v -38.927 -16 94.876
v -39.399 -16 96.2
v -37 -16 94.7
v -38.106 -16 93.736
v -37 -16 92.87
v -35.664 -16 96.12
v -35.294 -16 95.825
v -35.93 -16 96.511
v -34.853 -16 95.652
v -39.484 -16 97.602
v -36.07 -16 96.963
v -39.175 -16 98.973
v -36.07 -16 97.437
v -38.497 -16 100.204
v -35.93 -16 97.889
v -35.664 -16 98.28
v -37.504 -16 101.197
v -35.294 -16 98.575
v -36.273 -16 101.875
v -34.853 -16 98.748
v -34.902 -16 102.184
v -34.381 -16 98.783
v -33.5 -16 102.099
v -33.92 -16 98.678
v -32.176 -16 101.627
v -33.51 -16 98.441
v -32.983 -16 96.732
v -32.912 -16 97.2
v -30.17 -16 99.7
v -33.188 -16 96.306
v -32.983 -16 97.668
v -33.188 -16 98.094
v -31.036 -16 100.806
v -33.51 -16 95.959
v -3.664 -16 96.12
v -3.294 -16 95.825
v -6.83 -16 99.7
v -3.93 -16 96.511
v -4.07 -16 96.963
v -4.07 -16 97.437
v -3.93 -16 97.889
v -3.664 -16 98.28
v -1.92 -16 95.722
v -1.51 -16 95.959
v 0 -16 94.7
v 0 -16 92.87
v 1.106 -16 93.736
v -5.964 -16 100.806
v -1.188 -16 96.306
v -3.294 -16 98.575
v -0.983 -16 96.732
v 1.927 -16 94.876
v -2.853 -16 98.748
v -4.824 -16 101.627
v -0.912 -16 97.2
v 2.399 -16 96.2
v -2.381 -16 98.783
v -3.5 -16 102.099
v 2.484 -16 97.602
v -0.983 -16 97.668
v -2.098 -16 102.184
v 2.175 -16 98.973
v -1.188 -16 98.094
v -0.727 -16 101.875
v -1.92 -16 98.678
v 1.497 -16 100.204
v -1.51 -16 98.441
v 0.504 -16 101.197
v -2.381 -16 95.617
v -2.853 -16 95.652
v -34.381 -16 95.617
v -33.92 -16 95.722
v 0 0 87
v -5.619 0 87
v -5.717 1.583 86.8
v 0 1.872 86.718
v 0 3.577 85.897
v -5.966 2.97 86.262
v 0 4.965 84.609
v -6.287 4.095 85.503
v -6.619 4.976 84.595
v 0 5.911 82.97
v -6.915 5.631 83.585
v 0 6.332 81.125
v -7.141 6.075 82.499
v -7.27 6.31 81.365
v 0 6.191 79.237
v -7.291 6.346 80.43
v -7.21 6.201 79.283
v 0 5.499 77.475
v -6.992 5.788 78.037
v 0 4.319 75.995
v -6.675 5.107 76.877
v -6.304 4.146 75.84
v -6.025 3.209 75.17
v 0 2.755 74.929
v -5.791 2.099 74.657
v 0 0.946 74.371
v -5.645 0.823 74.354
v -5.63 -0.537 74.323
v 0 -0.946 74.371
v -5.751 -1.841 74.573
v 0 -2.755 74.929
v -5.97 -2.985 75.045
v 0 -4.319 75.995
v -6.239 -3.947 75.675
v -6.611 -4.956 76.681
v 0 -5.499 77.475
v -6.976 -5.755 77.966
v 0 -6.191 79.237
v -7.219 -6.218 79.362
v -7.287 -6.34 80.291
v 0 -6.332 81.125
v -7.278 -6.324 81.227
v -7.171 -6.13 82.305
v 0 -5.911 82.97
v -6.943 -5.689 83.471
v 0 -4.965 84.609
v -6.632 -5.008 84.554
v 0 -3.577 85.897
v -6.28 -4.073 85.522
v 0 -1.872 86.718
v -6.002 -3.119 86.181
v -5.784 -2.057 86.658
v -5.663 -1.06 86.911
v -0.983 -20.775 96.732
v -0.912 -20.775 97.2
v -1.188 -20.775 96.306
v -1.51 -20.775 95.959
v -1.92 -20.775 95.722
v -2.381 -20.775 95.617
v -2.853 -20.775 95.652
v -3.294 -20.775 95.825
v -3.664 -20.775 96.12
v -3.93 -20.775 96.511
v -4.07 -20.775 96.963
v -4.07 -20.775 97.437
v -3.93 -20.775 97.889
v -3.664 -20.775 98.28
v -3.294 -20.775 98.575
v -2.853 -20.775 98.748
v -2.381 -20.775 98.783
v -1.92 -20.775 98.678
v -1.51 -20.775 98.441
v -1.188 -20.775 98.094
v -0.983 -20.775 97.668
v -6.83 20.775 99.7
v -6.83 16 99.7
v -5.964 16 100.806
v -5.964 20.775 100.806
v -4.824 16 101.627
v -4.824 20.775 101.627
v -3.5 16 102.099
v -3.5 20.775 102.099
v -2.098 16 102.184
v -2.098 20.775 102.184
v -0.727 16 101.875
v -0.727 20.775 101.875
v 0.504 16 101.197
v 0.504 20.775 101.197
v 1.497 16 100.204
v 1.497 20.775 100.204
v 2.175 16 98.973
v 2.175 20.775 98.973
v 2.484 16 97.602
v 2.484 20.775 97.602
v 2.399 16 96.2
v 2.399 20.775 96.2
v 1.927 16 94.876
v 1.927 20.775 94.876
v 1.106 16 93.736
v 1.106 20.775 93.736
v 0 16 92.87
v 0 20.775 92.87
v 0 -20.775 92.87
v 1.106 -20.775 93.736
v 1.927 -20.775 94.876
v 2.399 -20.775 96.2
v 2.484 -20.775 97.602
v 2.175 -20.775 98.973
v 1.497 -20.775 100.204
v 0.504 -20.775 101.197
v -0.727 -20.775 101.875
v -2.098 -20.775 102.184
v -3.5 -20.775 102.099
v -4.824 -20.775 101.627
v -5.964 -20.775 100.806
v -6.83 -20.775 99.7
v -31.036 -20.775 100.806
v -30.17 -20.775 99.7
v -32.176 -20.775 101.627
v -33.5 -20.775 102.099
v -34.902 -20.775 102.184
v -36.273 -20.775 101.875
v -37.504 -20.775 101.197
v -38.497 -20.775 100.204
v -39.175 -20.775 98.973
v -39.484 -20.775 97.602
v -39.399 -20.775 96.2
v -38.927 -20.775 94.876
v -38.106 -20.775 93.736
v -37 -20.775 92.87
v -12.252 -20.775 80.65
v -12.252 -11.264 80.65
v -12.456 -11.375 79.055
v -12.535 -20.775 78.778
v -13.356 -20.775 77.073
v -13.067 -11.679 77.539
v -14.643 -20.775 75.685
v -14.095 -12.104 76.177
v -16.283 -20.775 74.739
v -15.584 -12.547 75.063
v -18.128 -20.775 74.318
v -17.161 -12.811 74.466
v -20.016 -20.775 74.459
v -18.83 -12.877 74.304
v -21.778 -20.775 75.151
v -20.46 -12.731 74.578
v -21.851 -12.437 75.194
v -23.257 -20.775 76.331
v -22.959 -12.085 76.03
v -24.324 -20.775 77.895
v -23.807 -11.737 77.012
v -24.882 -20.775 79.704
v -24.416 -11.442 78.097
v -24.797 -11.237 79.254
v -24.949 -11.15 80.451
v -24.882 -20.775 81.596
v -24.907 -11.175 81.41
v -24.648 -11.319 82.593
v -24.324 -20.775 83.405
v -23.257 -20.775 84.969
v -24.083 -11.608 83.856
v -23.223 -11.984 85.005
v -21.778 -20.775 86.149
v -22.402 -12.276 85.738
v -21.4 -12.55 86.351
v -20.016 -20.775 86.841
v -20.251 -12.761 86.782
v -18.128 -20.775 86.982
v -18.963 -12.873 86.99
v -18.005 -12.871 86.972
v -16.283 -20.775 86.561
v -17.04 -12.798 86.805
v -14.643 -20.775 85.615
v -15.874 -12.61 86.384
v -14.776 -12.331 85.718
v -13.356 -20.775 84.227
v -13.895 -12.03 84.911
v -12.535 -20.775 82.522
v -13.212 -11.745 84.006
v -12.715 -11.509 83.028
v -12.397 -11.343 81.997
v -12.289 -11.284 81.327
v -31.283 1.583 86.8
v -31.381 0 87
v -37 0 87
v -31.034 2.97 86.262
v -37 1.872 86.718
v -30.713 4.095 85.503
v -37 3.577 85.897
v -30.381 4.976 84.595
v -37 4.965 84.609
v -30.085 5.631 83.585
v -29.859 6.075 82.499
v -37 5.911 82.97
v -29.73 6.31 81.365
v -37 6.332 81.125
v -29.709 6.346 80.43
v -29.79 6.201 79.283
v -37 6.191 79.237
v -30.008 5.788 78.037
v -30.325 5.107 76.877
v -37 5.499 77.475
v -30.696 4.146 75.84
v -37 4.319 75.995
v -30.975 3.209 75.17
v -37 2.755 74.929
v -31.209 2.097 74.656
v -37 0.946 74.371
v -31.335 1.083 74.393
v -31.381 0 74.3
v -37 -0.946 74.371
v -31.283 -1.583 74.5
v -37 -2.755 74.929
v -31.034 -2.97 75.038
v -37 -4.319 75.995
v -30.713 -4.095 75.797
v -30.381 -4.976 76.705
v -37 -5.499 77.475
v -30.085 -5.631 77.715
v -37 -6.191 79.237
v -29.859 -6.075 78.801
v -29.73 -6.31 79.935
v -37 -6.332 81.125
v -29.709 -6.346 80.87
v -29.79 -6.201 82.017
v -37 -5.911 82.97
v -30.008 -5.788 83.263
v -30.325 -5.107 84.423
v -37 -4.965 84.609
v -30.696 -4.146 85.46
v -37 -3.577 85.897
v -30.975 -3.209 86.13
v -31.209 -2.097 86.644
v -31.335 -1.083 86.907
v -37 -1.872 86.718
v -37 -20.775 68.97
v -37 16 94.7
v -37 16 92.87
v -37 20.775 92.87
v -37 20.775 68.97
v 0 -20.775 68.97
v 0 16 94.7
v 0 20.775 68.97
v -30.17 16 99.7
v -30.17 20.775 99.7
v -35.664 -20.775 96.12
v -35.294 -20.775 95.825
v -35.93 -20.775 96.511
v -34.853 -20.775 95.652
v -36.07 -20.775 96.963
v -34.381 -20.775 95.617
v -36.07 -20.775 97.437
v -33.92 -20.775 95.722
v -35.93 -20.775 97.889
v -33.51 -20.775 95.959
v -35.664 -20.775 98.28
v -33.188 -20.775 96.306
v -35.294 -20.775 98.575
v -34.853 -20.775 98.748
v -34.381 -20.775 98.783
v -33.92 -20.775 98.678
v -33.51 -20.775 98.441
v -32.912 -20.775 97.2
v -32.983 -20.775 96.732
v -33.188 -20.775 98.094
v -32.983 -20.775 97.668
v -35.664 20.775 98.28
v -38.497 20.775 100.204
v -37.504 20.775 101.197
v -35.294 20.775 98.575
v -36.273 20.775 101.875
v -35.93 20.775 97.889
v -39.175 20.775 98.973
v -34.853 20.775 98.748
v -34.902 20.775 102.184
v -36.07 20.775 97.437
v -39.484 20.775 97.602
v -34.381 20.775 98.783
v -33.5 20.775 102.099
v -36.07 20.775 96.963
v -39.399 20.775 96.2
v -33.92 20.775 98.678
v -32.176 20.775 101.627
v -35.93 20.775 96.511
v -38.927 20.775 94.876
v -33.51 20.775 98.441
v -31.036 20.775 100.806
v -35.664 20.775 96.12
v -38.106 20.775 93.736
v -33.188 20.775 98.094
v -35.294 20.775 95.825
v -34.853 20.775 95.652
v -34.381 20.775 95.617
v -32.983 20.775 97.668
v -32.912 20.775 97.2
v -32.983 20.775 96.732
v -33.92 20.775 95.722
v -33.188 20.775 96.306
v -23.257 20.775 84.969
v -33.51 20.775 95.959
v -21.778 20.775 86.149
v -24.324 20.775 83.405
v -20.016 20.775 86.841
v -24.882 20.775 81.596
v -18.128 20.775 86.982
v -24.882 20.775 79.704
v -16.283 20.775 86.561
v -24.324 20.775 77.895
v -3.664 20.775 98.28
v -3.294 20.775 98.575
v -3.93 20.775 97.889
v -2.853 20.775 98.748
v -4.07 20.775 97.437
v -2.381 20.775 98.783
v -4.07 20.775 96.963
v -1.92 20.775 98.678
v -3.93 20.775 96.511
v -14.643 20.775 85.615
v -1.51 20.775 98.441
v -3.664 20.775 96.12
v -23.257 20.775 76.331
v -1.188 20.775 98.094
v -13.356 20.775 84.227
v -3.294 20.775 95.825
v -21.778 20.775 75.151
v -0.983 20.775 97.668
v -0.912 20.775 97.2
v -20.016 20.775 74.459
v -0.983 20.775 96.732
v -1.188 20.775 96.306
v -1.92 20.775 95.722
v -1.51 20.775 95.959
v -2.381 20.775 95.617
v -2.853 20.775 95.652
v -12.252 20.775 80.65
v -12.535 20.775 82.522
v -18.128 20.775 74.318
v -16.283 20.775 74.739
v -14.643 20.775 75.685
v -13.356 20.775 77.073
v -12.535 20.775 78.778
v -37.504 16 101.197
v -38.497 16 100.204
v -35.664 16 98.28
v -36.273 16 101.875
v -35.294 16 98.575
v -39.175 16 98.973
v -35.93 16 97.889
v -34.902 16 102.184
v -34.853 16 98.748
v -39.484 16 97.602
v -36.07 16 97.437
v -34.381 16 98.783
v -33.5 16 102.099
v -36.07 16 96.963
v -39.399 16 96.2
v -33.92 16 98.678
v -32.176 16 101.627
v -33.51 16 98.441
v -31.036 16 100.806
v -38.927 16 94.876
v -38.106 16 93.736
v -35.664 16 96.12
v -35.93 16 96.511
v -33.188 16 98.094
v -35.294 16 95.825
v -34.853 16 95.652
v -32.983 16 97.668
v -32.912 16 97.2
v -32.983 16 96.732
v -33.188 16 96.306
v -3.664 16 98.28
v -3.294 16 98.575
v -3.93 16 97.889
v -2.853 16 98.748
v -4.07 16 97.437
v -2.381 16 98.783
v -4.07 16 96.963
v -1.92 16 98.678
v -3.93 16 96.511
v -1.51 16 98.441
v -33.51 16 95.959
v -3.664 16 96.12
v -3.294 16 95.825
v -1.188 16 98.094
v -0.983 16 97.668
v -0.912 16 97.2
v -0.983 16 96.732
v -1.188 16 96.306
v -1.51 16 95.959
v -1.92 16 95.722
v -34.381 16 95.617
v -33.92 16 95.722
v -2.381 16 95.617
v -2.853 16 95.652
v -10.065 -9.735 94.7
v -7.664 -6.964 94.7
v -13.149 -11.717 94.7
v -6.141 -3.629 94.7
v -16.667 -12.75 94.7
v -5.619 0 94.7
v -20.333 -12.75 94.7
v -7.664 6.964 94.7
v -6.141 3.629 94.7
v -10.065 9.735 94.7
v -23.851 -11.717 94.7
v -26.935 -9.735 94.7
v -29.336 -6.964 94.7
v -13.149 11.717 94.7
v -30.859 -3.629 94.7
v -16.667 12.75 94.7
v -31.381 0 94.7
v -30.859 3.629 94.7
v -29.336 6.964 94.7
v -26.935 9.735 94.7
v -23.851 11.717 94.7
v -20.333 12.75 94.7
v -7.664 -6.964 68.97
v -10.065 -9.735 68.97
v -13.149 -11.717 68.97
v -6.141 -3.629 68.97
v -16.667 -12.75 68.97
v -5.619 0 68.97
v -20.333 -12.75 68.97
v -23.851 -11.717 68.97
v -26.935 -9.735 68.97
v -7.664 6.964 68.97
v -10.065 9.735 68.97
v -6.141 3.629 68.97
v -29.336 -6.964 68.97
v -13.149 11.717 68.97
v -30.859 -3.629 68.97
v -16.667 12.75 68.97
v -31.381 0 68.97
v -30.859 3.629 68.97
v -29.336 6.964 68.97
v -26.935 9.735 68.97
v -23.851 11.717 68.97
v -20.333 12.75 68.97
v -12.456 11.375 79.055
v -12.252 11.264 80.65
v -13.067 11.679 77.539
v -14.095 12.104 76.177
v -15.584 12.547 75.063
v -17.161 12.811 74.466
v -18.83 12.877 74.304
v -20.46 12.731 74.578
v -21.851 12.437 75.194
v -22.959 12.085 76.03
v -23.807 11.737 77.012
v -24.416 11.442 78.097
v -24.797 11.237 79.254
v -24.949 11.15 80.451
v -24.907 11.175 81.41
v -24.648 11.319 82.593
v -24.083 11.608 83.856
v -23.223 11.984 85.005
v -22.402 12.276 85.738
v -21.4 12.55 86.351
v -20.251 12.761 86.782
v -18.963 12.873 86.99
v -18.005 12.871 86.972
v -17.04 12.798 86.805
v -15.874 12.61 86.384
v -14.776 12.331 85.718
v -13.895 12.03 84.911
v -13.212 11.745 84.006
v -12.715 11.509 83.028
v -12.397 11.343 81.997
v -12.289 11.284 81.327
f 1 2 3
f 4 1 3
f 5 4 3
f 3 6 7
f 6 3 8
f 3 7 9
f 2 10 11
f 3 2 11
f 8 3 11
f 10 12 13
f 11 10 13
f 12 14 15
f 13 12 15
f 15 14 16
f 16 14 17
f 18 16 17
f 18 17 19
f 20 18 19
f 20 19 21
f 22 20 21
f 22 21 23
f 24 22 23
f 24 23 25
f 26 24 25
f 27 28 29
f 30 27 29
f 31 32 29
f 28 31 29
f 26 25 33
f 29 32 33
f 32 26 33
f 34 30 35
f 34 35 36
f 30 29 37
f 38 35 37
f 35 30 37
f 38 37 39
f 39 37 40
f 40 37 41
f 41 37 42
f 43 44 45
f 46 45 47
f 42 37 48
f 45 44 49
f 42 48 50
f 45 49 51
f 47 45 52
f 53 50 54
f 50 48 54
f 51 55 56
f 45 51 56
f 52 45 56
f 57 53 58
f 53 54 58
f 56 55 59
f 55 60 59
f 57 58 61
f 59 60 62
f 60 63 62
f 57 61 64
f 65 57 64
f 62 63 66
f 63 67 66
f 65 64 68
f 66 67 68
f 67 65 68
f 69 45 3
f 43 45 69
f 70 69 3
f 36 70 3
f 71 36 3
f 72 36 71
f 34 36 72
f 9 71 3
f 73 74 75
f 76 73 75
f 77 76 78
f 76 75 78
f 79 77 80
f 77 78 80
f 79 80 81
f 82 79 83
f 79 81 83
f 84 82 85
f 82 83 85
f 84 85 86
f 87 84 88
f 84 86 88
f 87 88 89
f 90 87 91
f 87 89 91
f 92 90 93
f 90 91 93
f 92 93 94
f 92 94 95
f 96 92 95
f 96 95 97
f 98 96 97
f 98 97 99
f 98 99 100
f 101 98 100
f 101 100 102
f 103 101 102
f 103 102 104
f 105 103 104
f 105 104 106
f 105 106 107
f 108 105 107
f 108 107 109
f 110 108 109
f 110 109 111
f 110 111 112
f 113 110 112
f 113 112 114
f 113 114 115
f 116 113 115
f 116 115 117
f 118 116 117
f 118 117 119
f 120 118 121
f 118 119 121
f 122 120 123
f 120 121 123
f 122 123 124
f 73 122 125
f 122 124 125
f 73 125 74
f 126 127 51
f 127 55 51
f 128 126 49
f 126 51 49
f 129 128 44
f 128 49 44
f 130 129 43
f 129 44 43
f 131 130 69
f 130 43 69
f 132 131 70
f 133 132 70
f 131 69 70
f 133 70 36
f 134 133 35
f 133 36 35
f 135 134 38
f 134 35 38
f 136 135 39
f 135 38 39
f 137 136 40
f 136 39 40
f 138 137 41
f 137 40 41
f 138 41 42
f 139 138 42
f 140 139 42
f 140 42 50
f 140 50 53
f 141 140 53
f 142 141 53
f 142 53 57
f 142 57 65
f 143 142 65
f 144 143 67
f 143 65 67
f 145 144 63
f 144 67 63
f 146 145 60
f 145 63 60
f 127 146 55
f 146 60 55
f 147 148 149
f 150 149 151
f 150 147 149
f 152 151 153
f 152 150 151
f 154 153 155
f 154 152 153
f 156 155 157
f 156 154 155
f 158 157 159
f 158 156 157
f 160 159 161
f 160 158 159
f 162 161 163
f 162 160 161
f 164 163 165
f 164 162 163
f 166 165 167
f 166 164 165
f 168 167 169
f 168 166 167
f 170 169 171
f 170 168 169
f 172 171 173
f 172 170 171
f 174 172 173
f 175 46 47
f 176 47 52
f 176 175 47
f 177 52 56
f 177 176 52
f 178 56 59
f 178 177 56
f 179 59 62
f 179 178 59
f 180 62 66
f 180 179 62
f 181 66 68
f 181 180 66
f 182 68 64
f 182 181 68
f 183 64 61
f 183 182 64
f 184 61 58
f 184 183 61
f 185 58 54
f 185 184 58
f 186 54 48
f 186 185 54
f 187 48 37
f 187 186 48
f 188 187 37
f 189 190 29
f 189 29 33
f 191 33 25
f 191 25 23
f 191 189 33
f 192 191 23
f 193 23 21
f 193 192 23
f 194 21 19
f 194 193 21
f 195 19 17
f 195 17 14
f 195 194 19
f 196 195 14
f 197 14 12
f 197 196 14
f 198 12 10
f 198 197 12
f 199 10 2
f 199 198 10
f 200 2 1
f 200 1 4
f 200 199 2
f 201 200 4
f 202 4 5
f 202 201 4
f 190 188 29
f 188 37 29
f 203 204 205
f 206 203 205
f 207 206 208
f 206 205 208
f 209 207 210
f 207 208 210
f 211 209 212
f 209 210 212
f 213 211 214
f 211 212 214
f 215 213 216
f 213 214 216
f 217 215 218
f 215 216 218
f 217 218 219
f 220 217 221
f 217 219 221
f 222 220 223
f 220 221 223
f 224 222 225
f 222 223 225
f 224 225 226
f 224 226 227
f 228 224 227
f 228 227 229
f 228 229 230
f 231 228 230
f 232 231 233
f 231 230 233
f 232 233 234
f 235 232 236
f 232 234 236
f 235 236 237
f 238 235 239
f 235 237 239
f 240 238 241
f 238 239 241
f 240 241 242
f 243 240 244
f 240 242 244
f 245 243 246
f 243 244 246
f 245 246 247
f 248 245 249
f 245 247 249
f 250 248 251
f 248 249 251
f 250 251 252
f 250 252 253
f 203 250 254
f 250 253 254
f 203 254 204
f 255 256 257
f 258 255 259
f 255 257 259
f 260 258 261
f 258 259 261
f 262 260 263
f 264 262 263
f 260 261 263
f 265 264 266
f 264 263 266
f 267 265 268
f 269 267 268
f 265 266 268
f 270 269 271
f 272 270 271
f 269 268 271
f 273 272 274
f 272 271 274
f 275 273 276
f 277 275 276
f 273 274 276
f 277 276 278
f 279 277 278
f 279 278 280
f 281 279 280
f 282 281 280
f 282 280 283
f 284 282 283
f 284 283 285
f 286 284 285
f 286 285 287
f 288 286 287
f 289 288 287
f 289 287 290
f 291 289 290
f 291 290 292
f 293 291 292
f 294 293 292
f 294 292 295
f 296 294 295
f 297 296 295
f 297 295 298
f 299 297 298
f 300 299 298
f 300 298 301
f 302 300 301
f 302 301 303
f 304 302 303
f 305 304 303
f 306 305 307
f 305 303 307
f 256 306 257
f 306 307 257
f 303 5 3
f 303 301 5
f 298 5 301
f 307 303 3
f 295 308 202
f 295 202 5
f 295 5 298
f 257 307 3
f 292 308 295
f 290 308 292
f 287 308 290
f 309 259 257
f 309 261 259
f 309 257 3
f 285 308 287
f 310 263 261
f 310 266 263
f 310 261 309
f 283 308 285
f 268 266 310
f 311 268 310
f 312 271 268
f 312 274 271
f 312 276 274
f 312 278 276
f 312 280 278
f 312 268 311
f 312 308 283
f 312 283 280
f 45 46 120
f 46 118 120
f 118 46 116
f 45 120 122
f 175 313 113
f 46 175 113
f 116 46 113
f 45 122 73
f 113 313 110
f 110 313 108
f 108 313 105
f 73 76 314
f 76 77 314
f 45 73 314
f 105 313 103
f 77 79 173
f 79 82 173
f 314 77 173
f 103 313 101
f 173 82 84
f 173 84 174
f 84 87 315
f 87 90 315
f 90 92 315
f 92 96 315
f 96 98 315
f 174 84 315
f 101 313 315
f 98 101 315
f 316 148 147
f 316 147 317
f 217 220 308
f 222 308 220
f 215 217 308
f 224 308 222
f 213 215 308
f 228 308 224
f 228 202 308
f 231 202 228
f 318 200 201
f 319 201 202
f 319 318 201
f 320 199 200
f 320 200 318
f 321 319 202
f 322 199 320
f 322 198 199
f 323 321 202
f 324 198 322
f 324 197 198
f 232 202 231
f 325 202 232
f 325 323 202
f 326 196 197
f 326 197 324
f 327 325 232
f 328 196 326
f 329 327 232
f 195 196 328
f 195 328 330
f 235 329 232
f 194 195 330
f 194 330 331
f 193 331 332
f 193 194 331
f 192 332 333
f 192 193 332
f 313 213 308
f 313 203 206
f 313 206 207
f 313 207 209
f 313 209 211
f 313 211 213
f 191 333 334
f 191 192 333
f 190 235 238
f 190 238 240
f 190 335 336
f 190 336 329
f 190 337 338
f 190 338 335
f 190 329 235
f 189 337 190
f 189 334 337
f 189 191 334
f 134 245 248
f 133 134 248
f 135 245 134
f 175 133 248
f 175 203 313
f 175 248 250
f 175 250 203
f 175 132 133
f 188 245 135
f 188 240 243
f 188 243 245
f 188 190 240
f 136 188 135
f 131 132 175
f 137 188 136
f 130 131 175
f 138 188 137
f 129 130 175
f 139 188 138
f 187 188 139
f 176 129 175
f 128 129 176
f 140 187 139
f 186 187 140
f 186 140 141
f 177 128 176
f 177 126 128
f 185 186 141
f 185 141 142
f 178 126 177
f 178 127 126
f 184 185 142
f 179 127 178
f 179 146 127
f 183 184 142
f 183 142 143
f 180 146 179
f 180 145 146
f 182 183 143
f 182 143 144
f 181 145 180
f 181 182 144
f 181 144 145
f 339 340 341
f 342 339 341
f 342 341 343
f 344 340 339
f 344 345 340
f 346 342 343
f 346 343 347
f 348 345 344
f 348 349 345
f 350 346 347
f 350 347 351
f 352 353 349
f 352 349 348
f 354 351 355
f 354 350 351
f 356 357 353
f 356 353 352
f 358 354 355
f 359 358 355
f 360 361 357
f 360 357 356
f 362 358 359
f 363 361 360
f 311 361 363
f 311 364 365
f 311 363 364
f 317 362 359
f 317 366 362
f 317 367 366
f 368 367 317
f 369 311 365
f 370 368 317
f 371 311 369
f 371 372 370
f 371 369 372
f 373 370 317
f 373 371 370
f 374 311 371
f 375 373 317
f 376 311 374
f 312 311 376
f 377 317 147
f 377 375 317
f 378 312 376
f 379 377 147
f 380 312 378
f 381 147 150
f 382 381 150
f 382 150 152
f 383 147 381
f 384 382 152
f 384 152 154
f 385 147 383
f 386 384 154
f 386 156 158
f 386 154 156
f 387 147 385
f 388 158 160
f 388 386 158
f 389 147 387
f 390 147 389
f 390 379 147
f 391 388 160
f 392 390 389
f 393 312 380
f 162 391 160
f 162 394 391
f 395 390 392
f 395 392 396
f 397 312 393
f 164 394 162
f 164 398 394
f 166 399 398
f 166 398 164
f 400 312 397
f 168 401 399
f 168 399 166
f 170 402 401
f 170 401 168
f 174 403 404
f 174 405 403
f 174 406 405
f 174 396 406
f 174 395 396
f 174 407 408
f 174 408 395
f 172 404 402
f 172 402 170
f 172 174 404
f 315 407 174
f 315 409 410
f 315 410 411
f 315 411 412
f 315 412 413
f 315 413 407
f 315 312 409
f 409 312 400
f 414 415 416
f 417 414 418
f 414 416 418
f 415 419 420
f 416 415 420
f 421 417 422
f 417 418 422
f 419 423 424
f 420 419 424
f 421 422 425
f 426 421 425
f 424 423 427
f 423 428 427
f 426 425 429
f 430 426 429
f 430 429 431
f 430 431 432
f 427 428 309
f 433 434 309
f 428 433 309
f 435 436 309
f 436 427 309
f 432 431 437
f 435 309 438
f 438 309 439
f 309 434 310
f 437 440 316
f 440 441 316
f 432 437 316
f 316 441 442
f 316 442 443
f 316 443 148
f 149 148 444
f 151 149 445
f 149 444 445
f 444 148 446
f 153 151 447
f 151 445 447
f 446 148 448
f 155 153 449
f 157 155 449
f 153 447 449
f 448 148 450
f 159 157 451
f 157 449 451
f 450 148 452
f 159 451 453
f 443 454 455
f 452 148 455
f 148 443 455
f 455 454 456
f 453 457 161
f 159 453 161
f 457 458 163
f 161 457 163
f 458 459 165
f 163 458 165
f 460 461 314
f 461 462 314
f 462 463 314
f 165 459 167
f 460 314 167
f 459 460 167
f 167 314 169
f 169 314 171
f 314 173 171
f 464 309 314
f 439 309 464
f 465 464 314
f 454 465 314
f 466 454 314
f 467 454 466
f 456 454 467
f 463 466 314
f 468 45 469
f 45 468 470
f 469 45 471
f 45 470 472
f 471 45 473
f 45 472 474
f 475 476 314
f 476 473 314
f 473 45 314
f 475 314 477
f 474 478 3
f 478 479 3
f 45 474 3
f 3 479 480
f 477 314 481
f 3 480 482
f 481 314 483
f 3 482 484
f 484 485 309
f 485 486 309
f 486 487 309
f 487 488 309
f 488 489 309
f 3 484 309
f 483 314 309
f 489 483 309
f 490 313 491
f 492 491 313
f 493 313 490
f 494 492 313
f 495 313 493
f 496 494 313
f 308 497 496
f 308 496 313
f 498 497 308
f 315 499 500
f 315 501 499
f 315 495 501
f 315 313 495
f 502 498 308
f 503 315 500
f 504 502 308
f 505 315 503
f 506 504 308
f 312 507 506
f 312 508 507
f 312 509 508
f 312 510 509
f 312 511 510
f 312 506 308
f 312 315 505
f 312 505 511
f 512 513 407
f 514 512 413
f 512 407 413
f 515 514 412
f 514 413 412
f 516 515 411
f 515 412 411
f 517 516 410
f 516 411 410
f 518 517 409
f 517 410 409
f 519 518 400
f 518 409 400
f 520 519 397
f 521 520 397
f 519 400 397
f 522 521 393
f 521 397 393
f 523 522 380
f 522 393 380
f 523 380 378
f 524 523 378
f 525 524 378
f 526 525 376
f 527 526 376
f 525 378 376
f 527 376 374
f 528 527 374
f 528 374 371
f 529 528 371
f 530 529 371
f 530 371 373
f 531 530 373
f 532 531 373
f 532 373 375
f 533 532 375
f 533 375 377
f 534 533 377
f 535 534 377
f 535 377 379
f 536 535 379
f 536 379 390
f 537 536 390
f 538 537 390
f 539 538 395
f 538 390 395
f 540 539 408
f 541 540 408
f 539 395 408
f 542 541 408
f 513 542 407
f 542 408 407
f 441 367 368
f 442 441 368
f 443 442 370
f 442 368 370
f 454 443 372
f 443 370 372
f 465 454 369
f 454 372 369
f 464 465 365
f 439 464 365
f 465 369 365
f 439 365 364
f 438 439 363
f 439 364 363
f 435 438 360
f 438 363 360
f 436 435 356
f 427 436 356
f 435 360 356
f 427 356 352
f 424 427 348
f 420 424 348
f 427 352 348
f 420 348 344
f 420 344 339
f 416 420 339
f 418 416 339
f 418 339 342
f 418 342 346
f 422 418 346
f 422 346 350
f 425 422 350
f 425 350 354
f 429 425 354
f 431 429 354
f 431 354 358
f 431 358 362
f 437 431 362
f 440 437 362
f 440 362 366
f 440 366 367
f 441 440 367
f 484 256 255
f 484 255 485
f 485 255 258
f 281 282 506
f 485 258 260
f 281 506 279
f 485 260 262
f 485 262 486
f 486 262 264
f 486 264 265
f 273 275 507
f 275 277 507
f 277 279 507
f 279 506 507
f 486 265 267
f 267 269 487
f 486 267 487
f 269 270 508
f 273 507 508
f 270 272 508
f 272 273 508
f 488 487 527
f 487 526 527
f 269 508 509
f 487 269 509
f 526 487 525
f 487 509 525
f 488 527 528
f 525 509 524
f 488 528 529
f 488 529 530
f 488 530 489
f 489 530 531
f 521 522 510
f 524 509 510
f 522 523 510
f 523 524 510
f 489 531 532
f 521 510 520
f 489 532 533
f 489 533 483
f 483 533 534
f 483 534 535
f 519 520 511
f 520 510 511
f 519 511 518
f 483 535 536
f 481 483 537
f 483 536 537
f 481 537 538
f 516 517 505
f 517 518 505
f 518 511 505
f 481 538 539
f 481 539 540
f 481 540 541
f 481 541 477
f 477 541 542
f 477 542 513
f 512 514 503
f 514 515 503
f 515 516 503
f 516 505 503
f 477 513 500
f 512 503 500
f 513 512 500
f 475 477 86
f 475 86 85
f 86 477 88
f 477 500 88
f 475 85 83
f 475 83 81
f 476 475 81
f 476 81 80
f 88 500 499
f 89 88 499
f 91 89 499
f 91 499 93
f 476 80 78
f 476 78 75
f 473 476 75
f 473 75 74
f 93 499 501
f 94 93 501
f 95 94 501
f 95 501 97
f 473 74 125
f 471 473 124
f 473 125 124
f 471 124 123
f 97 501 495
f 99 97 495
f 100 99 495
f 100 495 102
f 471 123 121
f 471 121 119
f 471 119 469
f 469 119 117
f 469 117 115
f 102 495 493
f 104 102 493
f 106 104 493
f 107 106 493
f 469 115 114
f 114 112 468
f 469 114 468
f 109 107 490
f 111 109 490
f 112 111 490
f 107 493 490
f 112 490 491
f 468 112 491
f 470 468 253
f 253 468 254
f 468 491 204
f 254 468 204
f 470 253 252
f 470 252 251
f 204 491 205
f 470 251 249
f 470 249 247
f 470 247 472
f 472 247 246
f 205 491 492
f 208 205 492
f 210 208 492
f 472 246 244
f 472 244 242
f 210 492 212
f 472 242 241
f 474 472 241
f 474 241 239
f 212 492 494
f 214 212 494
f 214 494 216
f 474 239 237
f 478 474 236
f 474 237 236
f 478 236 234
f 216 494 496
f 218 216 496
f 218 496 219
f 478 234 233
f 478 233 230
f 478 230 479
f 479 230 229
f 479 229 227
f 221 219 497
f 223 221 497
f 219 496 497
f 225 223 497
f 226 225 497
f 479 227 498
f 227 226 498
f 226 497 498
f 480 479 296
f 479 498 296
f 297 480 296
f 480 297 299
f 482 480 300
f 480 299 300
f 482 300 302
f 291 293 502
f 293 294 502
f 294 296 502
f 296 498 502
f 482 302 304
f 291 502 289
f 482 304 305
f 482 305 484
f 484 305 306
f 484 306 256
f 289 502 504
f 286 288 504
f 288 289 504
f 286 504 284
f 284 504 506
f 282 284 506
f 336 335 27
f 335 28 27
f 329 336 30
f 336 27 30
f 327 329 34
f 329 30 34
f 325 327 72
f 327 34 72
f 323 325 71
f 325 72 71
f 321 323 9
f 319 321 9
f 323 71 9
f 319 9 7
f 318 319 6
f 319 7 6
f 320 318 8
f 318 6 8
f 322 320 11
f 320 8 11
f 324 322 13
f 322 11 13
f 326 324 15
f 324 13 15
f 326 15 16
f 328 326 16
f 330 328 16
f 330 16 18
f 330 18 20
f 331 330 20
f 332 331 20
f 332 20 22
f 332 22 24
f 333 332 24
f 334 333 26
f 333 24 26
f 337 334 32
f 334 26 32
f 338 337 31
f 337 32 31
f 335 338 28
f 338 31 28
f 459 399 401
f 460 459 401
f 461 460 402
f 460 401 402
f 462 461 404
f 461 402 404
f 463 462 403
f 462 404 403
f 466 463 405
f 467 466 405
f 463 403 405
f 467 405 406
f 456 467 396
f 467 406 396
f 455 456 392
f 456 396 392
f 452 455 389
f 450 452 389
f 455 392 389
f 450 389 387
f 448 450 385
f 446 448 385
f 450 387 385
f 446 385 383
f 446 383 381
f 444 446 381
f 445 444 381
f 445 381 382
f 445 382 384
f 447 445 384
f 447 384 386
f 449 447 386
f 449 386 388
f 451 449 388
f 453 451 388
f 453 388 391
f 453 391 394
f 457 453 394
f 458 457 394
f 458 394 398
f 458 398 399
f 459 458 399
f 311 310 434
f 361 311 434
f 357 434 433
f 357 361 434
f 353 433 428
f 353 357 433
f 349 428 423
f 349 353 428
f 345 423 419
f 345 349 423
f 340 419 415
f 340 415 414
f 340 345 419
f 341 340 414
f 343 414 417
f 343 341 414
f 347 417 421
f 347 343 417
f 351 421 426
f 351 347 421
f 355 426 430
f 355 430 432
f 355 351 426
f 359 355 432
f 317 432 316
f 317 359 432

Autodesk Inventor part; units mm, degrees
ref_plane "YZ Plane" through (0, 0, 0) normal (1, 0, 0) x (0, 1, 0)
ref_plane "XZ Plane" through (0, 0, 0) normal (0, 1, 0) x (-1, 0, 0)
ref_plane "XY Plane" through (0, 0, 0) normal (0, 0, 1) x (1, 0, 0)
sketch "Sketch2" plane through (0, 0, 0) normal (1, 0, 0) x (0, 1, 0)
  circle A0 centre (0, 0) radius 12.881
  line L0 (-16, -18.5) -> (16, -18.5)
  line L1 (16, -18.5) -> (16, 18.5)
  line L2 (16, 18.5) -> (-16, 18.5)
  line L3 (-16, 18.5) -> (-16, -18.5)
  line L4 (-16, -18.5) -> (16, 18.5) construction
  line L5 (16, -18.5) -> (-16, 18.5) construction
  dimension "d9" = 25.762
  dimension "d10" = 32
  dimension "d11" = 37
extrude "Extrusion2" add sketch "Sketch2" along normal blind 76.2
sketch "Sketch3" plane through (0, -16, -18.5) normal (0, 0, -1) x (-1, 0, 0)
  line L0 (0, 0) -> (0, 32) projected
  circle A0 centre (18.5, 16) radius 12.881
  line L1 (0, 32) -> (0, 0)
  line L2 (0, 0) -> (37, 0)
  line L3 (37, 0) -> (37, 32)
  line L4 (37, 32) -> (0, 32)
  line L5 (0, 32) -> (37, 0) construction
  line L6 (0, 0) -> (37, 32) construction
  point P0 (0, 16)
  dimension "d14" = 25.762
  dimension "d15" = 32
  dimension "d16" = 37
extrude "Extrusion3" add sketch "Sketch3" against normal blind 113.2
sketch "Sketch4" plane through (76.2, -16, -18.5) normal (0, 0, -1) x (-1, 0, 0)
  circle A0 centre (94.7, 16) radius 12.881 projected
  point P0 (76.2, 16)
extrude "Extrusion4" add sketch "Sketch4" against normal blind 37
sketch "Sketch5" plane through (76.2, 16, 18.5) normal (0, 1, 0) x (1, 0, 0)
  line L0 (-113.2, 37) -> (0, 37) projected
  line L1 (-113.2, 37) -> (-113.2, -76.2) projected
  line L2 (-113.2, 37) -> (-100.1185, 50.0815)
  line L3 (-113.2, 37) -> (-94.7, 37) construction
  line L4 (-113.2, 37) -> (-126.2815, 23.9185)
  line L5 (-113.2, 37) -> (-94.7, 37) construction
  line L6 (-100.1185, 50.0815) -> (-154.0001, 103.963)
  line L7 (-126.2815, 23.9185) -> (-180.163, 77.8001)
  line L8 (-126.2815, 23.9185) -> (-50.0815, 23.9185) construction
  line L9 (-154.0001, 103.963) -> (-180.163, 77.8001)
  line L10 (-100.1185, 50.0815) -> (-87.037, 37)
  line L11 (-126.2815, 23.9185) -> (-113.2, 10.837)
  point P0 (-76.2, 18.5)
  dimension "d21" = 18.5
  dimension "d22" = 45
  dimension "d23" = 18.5
  dimension "d24" = 135
  dimension "d25" = 76.2
  dimension "d26" = 76.2
  dimension "d27" = 135
extrude "Extrusion5" add sketch "Sketch5" against normal blind 32
sketch "Sketch7" plane through (-77.8001, -16, -85.463) normal (-0.7071068, 0, -0.7071068) x (-0.7071068, 0, 0.7071068)
  line L0 (36.4256, 0.4968) -> (36.4256, 31.5032)
  line L1 (36.4256, 31.5032) -> (0.5744, 31.5032)
  line L2 (0.5744, 31.5032) -> (0.5744, 0.4968)
  line L3 (0.5744, 0.4968) -> (36.4256, 0.4968)
  circle A0 centre (18.5, 16) radius 12.881
  point P0 (5.4185, 16)
  point P1 (36.4256, 16)
  dimension "d131" = 25.762
extrude "Extrusion6" cut sketch "Sketch7" against normal blind 101.6 contours A0
sketch "Sketch8" plane through (76.2, 16, 18.5) normal (0, 1, 0) x (1, 0, 0)
  line L0 (-76.2, 0) -> (0, 0) projected
  line L1 (-87.037, 37) -> (0, 37) projected
  line L2 (-87.037, 37) -> (-154.0001, 103.963) projected
  line L3 (-180.163, 77.8001) -> (-113.2, 10.837) projected
  line L4 (-113.2, 10.837) -> (-113.2, -76.2) projected
  line L5 (-76.2, 0) -> (-76.2, -76.2) projected
  line L6 (0, 37) -> (5, 37)
  line L7 (5, 37) -> (5, 0)
  line L8 (5, 0) -> (0, 0)
  line L9 (0, 0) -> (0, 37)
  line L10 (-113.2, -76.2) -> (-76.2, -76.2)
  line L11 (-76.2, -76.2) -> (-76.2, -81.2)
  line L12 (-76.2, -81.2) -> (-113.2, -81.2)
  line L13 (-113.2, -81.2) -> (-113.2, -76.2)
  line L14 (-180.163, 77.8001) -> (-183.6985, 81.3356)
  line L15 (-183.6985, 81.3356) -> (-157.5356, 107.4985)
  line L16 (-157.5356, 107.4985) -> (-154.0001, 103.963)
  point P0 (-76.2, 18.5)
  dimension "d32" = 5
  dimension "d33" = 5
  dimension "d34" = 5
  dimension "d35" = 90
extrude "Extrusion7" add sketch "Sketch8" along normal blind 4.7752
sketch "Sketch9" plane through (76.2, -16, -18.5) normal (0, -1, 0) x (1, 0, 0)
  line L0 (-87.037, 0) -> (0, 0) projected
  line L1 (-76.2, 37) -> (0, 37) projected
  line L2 (-76.2, 37) -> (-76.2, 113.2) projected
  line L3 (-113.2, 26.163) -> (-113.2, 113.2) projected
  line L4 (-113.2, 26.163) -> (-180.163, -40.8001) projected
  line L5 (-154.0001, -66.963) -> (-87.037, 0) projected
  line L6 (-76.2, 118.2) -> (-76.2, 37) projected
  line L7 (-113.2, 113.2) -> (-76.2, 113.2)
  line L8 (-76.2, 113.2) -> (-76.2, 118.2)
  line L9 (-76.2, 118.2) -> (-113.2, 118.2)
  line L10 (-113.2, 118.2) -> (-113.2, 113.2)
  line L11 (-76.2, 37) -> (5, 37) projected
  line L12 (0, 0) -> (5, 0)
  line L13 (5, 0) -> (5, 37)
  line L14 (5, 37) -> (0, 37)
  line L15 (0, 37) -> (0, 0)
  line L16 (-183.6985, -44.3356) -> (-113.2, 26.163) projected
  line L17 (-180.163, -40.8001) -> (-183.6985, -44.3356)
  line L18 (-183.6985, -44.3356) -> (-157.5356, -70.4985)
  line L19 (-157.5356, -70.4985) -> (-154.0001, -66.963)
  point P0 (-76.2, 18.5)
extrude "Extrusion8" add sketch "Sketch9" along normal blind 4.7752
sketch "Sketch10" plane through (76.2, 20.7752, 18.5) normal (0, 1, 0) x (1, 0, 0)
  circle A0 centre (2.5, 34.5) radius 1.5875
  circle A1 centre (2.5, 2.5) radius 1.5875
  line L0 (0, 37) -> (0, 0)
  line L1 (0, 0) -> (5, 0)
  line L2 (5, 37) -> (5, 0)
  line L3 (0, 37) -> (5, 37)
  point P0 (-76.2, 18.5)
  point P1 (0, 18.5)
extrude "Extrusion9" cut sketch "Sketch10" against normal blind 279.4 contours A0 | A1
sketch "Sketch11" plane through (76.2, 20.7752, 18.5) normal (0, 1, 0) x (1, 0, 0)
  circle A0 centre (-78.7, -78.7) radius 1.5875
  circle A1 centre (-110.7, -78.7) radius 1.5875
  line L0 (-76.2, -76.2) -> (-113.2, -76.2)
  line L1 (-113.2, -76.2) -> (-113.2, -81.2)
  line L2 (-76.2, -81.2) -> (-113.2, -81.2)
  line L3 (-76.2, -76.2) -> (-76.2, -81.2)
  circle A2 centre (-157.5356, 103.963) radius 1.5875
  circle A3 centre (-180.163, 81.3356) radius 1.5875
  line L4 (-157.5356, 107.4985) -> (-183.6985, 81.3356)
  line L5 (-183.6985, 81.3356) -> (-180.163, 77.8001)
  line L6 (-154.0001, 103.963) -> (-180.163, 77.8001)
  line L7 (-157.5356, 107.4985) -> (-154.0001, 103.963)
  point P0 (-76.2, 18.5)
  point P1 (-94.7, -76.2)
  point P2 (-170.6171, 94.4171)
extrude "Extrusion10" cut sketch "Sketch11" against normal blind 279.4 contours A0 | A1 | A2 | A3
fillet "Fillet1" radius 3.175 3 edges at (-10.837, 0, -18.5) (0, 0, 18.5) (-37, 0, 7.663)
sketch "Sketch13" plane through (76.2, 20.7752, 18.5) normal (0, 1, 0) x (1, 0, 0)
  line L0 (-157.5356, 107.4985) -> (-183.6985, 81.3356) projected
  line L1 (-113.2, -81.2) -> (-76.2, -81.2) projected
  line L2 (5, 0) -> (5, 37) projected
  line L3 (5, 37) -> (5, 0) projected
  line L4 (5, 18.5) -> (-120.863, 18.5)
  line L5 (-114.1299, 11.767) -> (-183.6985, 81.3356) projected
  line L6 (-76.2, -81.2) -> (-113.2, -81.2) projected
  line L7 (-94.7, -81.2) -> (-95.2395, 19.0395)
  line L8 (-104.3477, 9.9312) -> (-86.1312, 28.1477) projected
  line L9 (-95.2395, 19.0395) -> (-170.6171, 94.4171)
  line L10 (-183.6985, 81.3356) -> (-157.5356, 107.4985) projected
  circle A0 centre (-14.05, 18.5) radius 6.35
  circle A1 centre (-39.45, 18.5) radius 6.35
  circle A2 centre (-64.85, 18.5) radius 6.35
  circle A3 centre (-90.25, 18.5) radius 6.35
  circle A4 centre (-94.8025, -62.15) radius 6.35
  circle A5 centre (-94.9392, -36.7504) radius 6.35
  circle A6 centre (-95.0759, -11.3507) radius 6.35
  circle A7 centre (-95.2126, 14.0489) radius 6.35
  circle A8 centre (-157.1467, 80.9467) radius 6.35
  circle A9 centre (-139.1862, 62.9862) radius 6.35
  circle A10 centre (-121.2257, 45.0257) radius 6.35
  circle A11 centre (-103.2651, 27.0651) radius 6.35
  point P0 (-76.2, 18.5)
  point P1 (-95.1101, -5.0008)
  point P2 (-95.0418, -17.7006)
  point P3 (-94.9734, -30.4005)
  point P4 (-94.9051, -43.1003)
  dimension "d60" = 12.7
  dimension "d61" = 19.05
  dimension "d64" = 25.4
  dimension "d69" = 12.7
  dimension "d70" = 19.05
  dimension "d73" = 25.4
  dimension "d78" = 12.7
  dimension "d79" = 19.05
  dimension "d82" = 25.4
extrude "Extrusion12" cut sketch "Sketch13" against normal blind 127 contours A8 L9 | L9 A8 | A9 L9 | L9 A9 | A11 L9 | L9 A11 | A10 L9 | L9 A10 | A0 L4 | L4 A0 | A1 L4 | L4 A1 | A2 L4 | L4 A2 | A4 L7 | L7 A4 | A5 L7 | L7 A5 | A6 L7 | L7 A6
sketch "Sketch14" plane through (81.2, 16, -18.5) normal (0, 0, -1) x (-1, 0, 0)
  line L0 (0, 4.7752) -> (90.7219, 4.7752) projected
  line L1 (0, 0) -> (0, 4.7752) projected
  circle A0 centre (19.05, -16) radius 6.35
  circle A1 centre (44.45, -16) radius 6.35
  circle A2 centre (69.85, -16) radius 6.35
  point P0 (81.2, -16)
  dimension "d89" = 12.7
  dimension "d91" = 19.05
  dimension "d94" = 25.4
extrude "Extrusion13" cut sketch "Sketch14" against normal blind 50.8
sketch "Sketch15" plane through (-37, 16, 94.7) normal (-1, 0, 0) x (0, 0, 1)
  line L0 (5, 0) -> (5, 4.7752) projected
  line L1 (-85.7219, 4.7752) -> (5, 4.7752) projected
  circle A0 centre (-14.05, -16) radius 6.35
  circle A1 centre (-39.45, -16) radius 6.35
  circle A2 centre (-64.85, -16) radius 6.35
  point P0 (-94.7, -16)
  dimension "d101" = 12.7
  dimension "d102" = 19.05
  dimension "d105" = 25.4
extrude "Extrusion14" cut sketch "Sketch15" against normal blind 50.8
sketch "Sketch16" plane through (-107.4985, 16, -62.8356) normal (-0.7071068, 0, 0.7071068) x (0.7071068, 0, 0.7071068)
  line L0 (0, 4.7752) -> (98.3849, 4.7752) projected
  line L1 (0, 0) -> (0, 4.7752) projected
  circle A0 centre (19.05, -16) radius 6.35
  circle A1 centre (44.45, -16) radius 6.35
  circle A2 centre (69.85, -16) radius 6.35
  point P0 (120.4444, -16)
  dimension "d112" = 12.7
  dimension "d113" = 19.05
  dimension "d116" = 25.4
extrude "Extrusion15" cut sketch "Sketch16" against normal blind 101.6
sketch "Sketch19" plane through (76.2, 20.7752, 18.5) normal (0, 1, 0) x (1, 0, 0)
  circle A0 centre (-157.5356, 103.963) radius 1.5875 projected
  circle A1 centre (-78.7, -78.7) radius 1.5875 projected
  circle A2 centre (-180.163, 81.3356) radius 1.5875 projected
  circle A3 centre (-110.7, -78.7) radius 1.5875 projected
  circle A4 centre (2.5, 2.5) radius 1.5875 projected
  circle A5 centre (2.5, 34.5) radius 1.5875 projected
  line L0 (-87.967, 37.9299) -> (-157.5356, 107.4985) projected
  line L1 (-157.5356, 107.4985) -> (-183.6985, 81.3356) projected
  line L2 (-183.6985, 81.3356) -> (-114.1299, 11.767) projected
  line L3 (-113.2, 9.5219) -> (-113.2, -81.2) projected
  line L4 (-113.2, -81.2) -> (-76.2, -81.2) projected
  line L5 (-76.2, -81.2) -> (-76.2, -3.175) projected
  line L6 (-73.025, 0) -> (5, 0) projected
  line L7 (5, 0) -> (5, 37) projected
  line L8 (5, 37) -> (-85.7219, 37) projected
  circle A6 centre (2.5, 2.5) radius 5
  circle A7 centre (2.5, 34.5) radius 5
  circle A8 centre (-110.7, -78.7) radius 5
  circle A9 centre (-78.7, -78.7) radius 5
  circle A10 centre (-180.163, 81.3356) radius 5
  circle A11 centre (-157.5356, 103.963) radius 5
  point P0 (-76.2, 18.5)
  point P1 (-76.2, -74.3699)
  point P2 (-83.0301, -81.2)
  point P3 (-113.2, -74.3699)
  point P4 (-106.3699, -81.2)
  point P5 (-178.8689, 86.1652)
  point P6 (-178.8689, 76.506)
  point P7 (-152.706, 102.6689)
  point P8 (-162.3652, 102.6689)
  point P9 (5, 6.8301)
  point P10 (-1.8301, 0)
  point P11 (-1.8301, 37)
  point P12 (5, 30.1699)
  dimension "d132" = 10
  dimension "d133" = 10
  dimension "d134" = 10
  dimension "d135" = 10
  dimension "d136" = 10
  dimension "d137" = 10
extrude "Extrusion17" add sketch "Sketch19" against normal blind 4.7752 contours L0 L1 A11 | L1 L2 A10 | L3 L4 A8 | L4 L5 A9 | L6 L7 A6 | L7 L8 A7 picked at (-160.8118, 104.679) picked at (-180.881, 84.6119) picked at (-108.8911, -81.5244) picked at (-80.5163, -81.5168) picked at (0.6837, -0.3168) picked at (0.6837, 37.3168)
sketch "Sketch20" plane through (76.2, -20.7752, -18.5) normal (0, -1, 0) x (1, 0, 0)
  circle A0 centre (-157.5356, -66.963) radius 1.5875 projected
  circle A1 centre (-180.163, -44.3356) radius 1.5875 projected
  circle A2 centre (2.5, 34.5) radius 1.5875 projected
  circle A3 centre (2.5, 2.5) radius 1.5875 projected
  line L0 (-157.5356, -70.4985) -> (-87.967, -0.9299) projected
  line L1 (-85.7219, 0) -> (5, 0) projected
  line L2 (5, 0) -> (5, 37) projected
  line L3 (5, 37) -> (-73.025, 37) projected
  line L4 (-76.2, 40.175) -> (-76.2, 118.2) projected
  line L5 (-76.2, 118.2) -> (-113.2, 118.2) projected
  line L6 (-113.2, 118.2) -> (-113.2, 27.4781) projected
  line L7 (-114.1299, 25.233) -> (-183.6985, -44.3356) projected
  line L8 (-183.6985, -44.3356) -> (-157.5356, -70.4985) projected
  circle A4 centre (-157.5356, -66.963) radius 5
  circle A5 centre (-180.163, -44.3356) radius 5
  circle A6 centre (-110.7, 115.7) radius 1.5875 projected
  circle A7 centre (-110.7, 115.7) radius 5
  circle A8 centre (-78.7, 115.7) radius 1.5875 projected
  circle A9 centre (-78.7, 115.7) radius 5
  circle A10 centre (2.5, 34.5) radius 5
  circle A11 centre (2.5, 2.5) radius 5
  point P0 (-76.2, 18.5)
  point P1 (5, 6.8301)
  point P2 (-1.8301, 0)
  point P3 (-1.8301, 37)
  point P4 (5, 30.1699)
  point P5 (-83.0301, 118.2)
  point P6 (-76.2, 111.3699)
  point P7 (-106.3699, 118.2)
  point P8 (-113.2, 111.3699)
  point P9 (-162.3652, -65.6689)
  point P10 (-152.706, -65.6689)
  point P11 (-178.8689, -39.506)
  point P12 (-178.8689, -49.1652)
extrude "Extrusion18" add sketch "Sketch20" against normal blind 4.7752 contours L0 A4 L8 | L1 L2 A11 | L2 L3 A10 | L4 L5 A9 | L5 L6 A7 | L7 L8 A5 picked at (-160.8118, -67.679) picked at (0.6837, -0.3168) picked at (0.6837, 37.3168) picked at (-80.5163, 118.5168) picked at (-113.5244, 113.8911) picked at (-180.881, -47.6119)
sketch "Sketch21" plane through (76.2, 20.7752, 18.5) normal (0, 1, 0) x (1, 0, 0)
  circle A0 centre (-103.2651, 27.0651) radius 6.35 projected
  circle A1 centre (-14.05, 18.5) radius 6.35 projected
  circle A2 centre (-157.1467, 80.9467) radius 6.35 projected
  circle A3 centre (-95.0759, -11.3507) radius 6.35 projected
  circle A4 centre (-121.2257, 45.0257) radius 6.35 projected
  circle A5 centre (-39.45, 18.5) radius 6.35 projected
  circle A6 centre (-64.85, 18.5) radius 6.35 projected
  circle A7 centre (-139.1862, 62.9862) radius 6.35 projected
  circle A8 centre (-94.9392, -36.7504) radius 6.35 projected
  circle A9 centre (-157.5356, 103.963) radius 1.5875 projected
  circle A10 centre (-180.163, 81.3356) radius 1.5875 projected
  circle A11 centre (2.5, 2.5) radius 1.5875 projected
  circle A12 centre (2.5, 34.5) radius 1.5875 projected
  line L0 (-201.6081, 114.1304) -> (16.4266, 114.1304)
  line L1 (16.4266, 114.1304) -> (16.4266, -50.4697)
  line L2 (16.4266, -50.4697) -> (-201.6081, -50.4697)
  line L3 (-201.6081, -50.4697) -> (-201.6081, 114.1304)
  point P0 (-76.2, 18.5)
extrude "Extrusion19" cut sketch "Sketch21" against normal blind 76.2
properties part number "testPrintBracketV2"
